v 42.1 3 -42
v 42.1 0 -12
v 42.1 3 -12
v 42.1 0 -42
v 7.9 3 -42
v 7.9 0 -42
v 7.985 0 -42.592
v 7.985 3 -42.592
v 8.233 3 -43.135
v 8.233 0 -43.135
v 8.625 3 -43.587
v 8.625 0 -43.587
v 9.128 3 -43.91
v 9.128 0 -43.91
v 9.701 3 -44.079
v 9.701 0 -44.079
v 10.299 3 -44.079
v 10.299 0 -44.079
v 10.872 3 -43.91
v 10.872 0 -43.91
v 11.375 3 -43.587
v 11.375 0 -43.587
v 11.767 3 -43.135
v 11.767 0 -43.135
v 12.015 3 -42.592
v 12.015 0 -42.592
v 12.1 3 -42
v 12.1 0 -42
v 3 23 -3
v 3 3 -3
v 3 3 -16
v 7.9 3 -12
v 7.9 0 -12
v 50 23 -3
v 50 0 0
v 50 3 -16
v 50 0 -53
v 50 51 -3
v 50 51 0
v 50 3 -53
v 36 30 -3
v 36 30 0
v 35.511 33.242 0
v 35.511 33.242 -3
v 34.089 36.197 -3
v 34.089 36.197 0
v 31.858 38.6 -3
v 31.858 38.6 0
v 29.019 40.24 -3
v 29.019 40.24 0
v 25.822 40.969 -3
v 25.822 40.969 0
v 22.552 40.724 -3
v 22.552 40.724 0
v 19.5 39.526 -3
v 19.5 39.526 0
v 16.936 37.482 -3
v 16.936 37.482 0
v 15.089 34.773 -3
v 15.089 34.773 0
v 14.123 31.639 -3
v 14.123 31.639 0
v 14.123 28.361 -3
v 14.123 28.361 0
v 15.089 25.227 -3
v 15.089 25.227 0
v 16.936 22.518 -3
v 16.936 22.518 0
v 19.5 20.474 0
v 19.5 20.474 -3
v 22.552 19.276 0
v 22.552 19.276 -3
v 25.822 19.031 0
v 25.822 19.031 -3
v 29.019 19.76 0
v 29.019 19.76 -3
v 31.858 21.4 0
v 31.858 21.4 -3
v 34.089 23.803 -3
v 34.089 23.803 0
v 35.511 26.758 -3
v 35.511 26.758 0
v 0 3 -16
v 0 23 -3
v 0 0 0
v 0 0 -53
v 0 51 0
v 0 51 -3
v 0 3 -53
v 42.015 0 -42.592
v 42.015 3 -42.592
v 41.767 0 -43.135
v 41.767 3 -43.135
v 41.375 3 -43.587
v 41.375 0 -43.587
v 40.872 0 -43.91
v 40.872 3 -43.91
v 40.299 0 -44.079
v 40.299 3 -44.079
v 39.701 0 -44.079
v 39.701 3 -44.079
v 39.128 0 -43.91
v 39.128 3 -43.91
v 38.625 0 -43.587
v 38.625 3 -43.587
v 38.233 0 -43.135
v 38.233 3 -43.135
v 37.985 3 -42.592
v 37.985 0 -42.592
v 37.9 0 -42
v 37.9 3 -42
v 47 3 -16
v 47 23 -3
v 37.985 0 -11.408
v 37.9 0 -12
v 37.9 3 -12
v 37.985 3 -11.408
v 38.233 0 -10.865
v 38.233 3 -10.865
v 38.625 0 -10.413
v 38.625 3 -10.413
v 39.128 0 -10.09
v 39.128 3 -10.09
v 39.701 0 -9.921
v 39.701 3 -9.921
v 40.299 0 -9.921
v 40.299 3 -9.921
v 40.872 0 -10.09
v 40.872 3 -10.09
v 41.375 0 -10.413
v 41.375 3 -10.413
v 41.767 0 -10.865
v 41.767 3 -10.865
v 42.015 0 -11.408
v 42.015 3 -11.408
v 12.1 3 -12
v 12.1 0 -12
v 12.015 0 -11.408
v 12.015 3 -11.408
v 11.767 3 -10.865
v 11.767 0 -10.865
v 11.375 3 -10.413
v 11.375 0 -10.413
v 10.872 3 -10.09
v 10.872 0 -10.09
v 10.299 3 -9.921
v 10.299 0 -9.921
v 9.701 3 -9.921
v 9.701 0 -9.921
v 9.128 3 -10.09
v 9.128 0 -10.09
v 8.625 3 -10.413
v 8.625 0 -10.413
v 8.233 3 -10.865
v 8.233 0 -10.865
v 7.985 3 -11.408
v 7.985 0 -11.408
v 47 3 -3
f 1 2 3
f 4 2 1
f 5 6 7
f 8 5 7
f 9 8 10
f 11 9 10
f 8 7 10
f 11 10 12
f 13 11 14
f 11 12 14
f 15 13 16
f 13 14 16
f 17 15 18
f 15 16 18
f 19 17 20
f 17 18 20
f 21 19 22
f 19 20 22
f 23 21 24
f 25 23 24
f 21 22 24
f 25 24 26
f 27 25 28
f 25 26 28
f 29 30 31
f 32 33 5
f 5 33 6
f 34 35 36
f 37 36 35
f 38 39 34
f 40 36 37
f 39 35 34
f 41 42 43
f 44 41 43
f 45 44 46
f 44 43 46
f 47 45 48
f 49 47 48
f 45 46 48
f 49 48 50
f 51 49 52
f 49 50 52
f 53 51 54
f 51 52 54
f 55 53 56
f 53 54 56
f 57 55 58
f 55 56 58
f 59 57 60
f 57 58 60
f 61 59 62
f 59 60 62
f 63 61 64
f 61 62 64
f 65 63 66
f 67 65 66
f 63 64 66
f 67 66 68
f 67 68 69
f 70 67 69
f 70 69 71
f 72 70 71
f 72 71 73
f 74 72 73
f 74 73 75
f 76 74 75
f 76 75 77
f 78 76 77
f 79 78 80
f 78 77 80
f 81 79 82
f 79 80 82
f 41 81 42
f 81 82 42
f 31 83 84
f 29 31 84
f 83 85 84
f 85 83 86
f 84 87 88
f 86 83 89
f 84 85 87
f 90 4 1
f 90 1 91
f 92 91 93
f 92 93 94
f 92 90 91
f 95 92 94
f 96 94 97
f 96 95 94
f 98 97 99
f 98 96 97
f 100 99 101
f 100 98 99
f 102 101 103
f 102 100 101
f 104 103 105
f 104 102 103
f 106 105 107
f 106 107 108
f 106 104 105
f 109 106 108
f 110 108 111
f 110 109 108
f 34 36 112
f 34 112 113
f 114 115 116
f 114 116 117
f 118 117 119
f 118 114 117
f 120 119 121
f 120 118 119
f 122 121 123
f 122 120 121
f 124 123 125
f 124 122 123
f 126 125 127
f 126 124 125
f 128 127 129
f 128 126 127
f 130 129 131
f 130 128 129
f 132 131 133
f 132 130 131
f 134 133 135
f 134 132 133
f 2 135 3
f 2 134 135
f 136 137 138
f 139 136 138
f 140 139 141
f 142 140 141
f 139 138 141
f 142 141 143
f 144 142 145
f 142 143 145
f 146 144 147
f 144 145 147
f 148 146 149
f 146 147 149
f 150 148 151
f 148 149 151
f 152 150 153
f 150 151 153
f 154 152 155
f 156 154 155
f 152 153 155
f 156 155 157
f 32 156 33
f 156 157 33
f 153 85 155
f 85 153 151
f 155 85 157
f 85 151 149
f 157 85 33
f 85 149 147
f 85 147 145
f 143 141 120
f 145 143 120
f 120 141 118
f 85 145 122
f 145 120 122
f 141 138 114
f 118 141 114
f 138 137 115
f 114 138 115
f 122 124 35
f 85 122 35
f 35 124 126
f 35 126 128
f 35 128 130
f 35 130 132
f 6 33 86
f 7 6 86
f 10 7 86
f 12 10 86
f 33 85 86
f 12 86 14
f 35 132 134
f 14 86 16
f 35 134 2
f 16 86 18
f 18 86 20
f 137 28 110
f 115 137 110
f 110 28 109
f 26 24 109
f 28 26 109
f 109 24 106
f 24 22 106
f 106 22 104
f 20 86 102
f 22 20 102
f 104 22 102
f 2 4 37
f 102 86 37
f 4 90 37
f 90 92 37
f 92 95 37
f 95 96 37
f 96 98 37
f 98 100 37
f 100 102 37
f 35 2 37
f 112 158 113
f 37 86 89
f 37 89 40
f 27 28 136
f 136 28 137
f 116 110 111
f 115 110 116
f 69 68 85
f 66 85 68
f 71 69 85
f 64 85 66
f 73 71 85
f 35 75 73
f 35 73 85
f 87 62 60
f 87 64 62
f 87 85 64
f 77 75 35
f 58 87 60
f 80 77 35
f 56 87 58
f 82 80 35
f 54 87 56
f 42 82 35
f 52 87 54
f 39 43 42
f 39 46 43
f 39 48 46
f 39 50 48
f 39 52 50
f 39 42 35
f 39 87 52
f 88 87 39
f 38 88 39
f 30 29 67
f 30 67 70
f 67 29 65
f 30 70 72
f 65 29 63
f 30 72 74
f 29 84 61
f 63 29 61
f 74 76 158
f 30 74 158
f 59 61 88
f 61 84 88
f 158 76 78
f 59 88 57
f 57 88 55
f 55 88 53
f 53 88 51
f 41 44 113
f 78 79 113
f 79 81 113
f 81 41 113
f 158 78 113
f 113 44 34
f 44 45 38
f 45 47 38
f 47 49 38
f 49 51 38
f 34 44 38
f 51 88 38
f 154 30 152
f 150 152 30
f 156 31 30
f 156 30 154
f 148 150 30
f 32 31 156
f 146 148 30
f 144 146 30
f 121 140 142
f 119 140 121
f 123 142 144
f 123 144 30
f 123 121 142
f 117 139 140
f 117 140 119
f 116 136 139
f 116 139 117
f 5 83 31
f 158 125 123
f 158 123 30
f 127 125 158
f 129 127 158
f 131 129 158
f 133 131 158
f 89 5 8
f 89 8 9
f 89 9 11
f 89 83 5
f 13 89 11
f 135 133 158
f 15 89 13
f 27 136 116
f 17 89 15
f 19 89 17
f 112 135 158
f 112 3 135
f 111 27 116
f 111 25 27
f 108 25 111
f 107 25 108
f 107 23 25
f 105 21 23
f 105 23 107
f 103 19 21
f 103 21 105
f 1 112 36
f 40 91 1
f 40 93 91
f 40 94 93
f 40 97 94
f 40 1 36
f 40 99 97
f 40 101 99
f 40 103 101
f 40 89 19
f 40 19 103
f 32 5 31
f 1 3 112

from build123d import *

# Parameters (mm, degrees)
SKETCH2_W           = 50
SKETCH2_H           = 53
BOSS_EXTRUDE1_DEPTH = 3
SKETCH3_W           = 50
SKETCH3_H           = 48
SKETCH3_R           = 11
BOSS_EXTRUDE2_DEPTH = 3
BOSS_EXTRUDE3_DEPTH = 3


with BuildPart() as part:
    # Sketch2 → Boss-Extrude1 (new body)
    with BuildSketch(Plane(origin=(0, 0, 0), x_dir=(1, 0, 0), z_dir=(0, 1, 0))):
        with Locations((25, 26.5)):
            Rectangle(SKETCH2_W, SKETCH2_H)
        with BuildLine():
            Line((7.9, 12), (7.9, 42))
            ThreePointArc((7.9, 42), (10, 44.1), (12.1, 42))
            Line((12.1, 42), (12.1, 12))
            ThreePointArc((12.1, 12), (10, 9.9), (7.9, 12))
        make_face(mode=Mode.SUBTRACT)
        with BuildLine():
            Line((42.1, 12), (42.1, 42))
            ThreePointArc((42.1, 42), (40, 44.1), (37.9, 42))
            Line((37.9, 42), (37.9, 12))
            ThreePointArc((37.9, 12), (40, 9.9), (42.1, 12))
        make_face(mode=Mode.SUBTRACT)
    extrude(amount=BOSS_EXTRUDE1_DEPTH)

    # Sketch3 → Boss-Extrude2 (add)
    with BuildSketch(Plane.XY):
        with Locations((25, 27)):
            Rectangle(SKETCH3_W, SKETCH3_H)
        with Locations((25, 30)):
            Circle(SKETCH3_R, mode=Mode.SUBTRACT)
    extrude(amount=-BOSS_EXTRUDE2_DEPTH)

    # Sketch4 → Boss-Extrude3 (add)
    with BuildSketch(Plane(origin=(50, 0, 0), x_dir=(0, 0, -1), z_dir=(1, 0, 0))):
        Polygon((16, 3), (3, 23), (3, 3), align=None)
    boss_extrude3 = extrude(amount=-BOSS_EXTRUDE3_DEPTH)

    # Mirror1: Boss-Extrude3 across plane
    add(boss_extrude3.mirror(Plane.ZY.offset(-25)))


solid = part.part
